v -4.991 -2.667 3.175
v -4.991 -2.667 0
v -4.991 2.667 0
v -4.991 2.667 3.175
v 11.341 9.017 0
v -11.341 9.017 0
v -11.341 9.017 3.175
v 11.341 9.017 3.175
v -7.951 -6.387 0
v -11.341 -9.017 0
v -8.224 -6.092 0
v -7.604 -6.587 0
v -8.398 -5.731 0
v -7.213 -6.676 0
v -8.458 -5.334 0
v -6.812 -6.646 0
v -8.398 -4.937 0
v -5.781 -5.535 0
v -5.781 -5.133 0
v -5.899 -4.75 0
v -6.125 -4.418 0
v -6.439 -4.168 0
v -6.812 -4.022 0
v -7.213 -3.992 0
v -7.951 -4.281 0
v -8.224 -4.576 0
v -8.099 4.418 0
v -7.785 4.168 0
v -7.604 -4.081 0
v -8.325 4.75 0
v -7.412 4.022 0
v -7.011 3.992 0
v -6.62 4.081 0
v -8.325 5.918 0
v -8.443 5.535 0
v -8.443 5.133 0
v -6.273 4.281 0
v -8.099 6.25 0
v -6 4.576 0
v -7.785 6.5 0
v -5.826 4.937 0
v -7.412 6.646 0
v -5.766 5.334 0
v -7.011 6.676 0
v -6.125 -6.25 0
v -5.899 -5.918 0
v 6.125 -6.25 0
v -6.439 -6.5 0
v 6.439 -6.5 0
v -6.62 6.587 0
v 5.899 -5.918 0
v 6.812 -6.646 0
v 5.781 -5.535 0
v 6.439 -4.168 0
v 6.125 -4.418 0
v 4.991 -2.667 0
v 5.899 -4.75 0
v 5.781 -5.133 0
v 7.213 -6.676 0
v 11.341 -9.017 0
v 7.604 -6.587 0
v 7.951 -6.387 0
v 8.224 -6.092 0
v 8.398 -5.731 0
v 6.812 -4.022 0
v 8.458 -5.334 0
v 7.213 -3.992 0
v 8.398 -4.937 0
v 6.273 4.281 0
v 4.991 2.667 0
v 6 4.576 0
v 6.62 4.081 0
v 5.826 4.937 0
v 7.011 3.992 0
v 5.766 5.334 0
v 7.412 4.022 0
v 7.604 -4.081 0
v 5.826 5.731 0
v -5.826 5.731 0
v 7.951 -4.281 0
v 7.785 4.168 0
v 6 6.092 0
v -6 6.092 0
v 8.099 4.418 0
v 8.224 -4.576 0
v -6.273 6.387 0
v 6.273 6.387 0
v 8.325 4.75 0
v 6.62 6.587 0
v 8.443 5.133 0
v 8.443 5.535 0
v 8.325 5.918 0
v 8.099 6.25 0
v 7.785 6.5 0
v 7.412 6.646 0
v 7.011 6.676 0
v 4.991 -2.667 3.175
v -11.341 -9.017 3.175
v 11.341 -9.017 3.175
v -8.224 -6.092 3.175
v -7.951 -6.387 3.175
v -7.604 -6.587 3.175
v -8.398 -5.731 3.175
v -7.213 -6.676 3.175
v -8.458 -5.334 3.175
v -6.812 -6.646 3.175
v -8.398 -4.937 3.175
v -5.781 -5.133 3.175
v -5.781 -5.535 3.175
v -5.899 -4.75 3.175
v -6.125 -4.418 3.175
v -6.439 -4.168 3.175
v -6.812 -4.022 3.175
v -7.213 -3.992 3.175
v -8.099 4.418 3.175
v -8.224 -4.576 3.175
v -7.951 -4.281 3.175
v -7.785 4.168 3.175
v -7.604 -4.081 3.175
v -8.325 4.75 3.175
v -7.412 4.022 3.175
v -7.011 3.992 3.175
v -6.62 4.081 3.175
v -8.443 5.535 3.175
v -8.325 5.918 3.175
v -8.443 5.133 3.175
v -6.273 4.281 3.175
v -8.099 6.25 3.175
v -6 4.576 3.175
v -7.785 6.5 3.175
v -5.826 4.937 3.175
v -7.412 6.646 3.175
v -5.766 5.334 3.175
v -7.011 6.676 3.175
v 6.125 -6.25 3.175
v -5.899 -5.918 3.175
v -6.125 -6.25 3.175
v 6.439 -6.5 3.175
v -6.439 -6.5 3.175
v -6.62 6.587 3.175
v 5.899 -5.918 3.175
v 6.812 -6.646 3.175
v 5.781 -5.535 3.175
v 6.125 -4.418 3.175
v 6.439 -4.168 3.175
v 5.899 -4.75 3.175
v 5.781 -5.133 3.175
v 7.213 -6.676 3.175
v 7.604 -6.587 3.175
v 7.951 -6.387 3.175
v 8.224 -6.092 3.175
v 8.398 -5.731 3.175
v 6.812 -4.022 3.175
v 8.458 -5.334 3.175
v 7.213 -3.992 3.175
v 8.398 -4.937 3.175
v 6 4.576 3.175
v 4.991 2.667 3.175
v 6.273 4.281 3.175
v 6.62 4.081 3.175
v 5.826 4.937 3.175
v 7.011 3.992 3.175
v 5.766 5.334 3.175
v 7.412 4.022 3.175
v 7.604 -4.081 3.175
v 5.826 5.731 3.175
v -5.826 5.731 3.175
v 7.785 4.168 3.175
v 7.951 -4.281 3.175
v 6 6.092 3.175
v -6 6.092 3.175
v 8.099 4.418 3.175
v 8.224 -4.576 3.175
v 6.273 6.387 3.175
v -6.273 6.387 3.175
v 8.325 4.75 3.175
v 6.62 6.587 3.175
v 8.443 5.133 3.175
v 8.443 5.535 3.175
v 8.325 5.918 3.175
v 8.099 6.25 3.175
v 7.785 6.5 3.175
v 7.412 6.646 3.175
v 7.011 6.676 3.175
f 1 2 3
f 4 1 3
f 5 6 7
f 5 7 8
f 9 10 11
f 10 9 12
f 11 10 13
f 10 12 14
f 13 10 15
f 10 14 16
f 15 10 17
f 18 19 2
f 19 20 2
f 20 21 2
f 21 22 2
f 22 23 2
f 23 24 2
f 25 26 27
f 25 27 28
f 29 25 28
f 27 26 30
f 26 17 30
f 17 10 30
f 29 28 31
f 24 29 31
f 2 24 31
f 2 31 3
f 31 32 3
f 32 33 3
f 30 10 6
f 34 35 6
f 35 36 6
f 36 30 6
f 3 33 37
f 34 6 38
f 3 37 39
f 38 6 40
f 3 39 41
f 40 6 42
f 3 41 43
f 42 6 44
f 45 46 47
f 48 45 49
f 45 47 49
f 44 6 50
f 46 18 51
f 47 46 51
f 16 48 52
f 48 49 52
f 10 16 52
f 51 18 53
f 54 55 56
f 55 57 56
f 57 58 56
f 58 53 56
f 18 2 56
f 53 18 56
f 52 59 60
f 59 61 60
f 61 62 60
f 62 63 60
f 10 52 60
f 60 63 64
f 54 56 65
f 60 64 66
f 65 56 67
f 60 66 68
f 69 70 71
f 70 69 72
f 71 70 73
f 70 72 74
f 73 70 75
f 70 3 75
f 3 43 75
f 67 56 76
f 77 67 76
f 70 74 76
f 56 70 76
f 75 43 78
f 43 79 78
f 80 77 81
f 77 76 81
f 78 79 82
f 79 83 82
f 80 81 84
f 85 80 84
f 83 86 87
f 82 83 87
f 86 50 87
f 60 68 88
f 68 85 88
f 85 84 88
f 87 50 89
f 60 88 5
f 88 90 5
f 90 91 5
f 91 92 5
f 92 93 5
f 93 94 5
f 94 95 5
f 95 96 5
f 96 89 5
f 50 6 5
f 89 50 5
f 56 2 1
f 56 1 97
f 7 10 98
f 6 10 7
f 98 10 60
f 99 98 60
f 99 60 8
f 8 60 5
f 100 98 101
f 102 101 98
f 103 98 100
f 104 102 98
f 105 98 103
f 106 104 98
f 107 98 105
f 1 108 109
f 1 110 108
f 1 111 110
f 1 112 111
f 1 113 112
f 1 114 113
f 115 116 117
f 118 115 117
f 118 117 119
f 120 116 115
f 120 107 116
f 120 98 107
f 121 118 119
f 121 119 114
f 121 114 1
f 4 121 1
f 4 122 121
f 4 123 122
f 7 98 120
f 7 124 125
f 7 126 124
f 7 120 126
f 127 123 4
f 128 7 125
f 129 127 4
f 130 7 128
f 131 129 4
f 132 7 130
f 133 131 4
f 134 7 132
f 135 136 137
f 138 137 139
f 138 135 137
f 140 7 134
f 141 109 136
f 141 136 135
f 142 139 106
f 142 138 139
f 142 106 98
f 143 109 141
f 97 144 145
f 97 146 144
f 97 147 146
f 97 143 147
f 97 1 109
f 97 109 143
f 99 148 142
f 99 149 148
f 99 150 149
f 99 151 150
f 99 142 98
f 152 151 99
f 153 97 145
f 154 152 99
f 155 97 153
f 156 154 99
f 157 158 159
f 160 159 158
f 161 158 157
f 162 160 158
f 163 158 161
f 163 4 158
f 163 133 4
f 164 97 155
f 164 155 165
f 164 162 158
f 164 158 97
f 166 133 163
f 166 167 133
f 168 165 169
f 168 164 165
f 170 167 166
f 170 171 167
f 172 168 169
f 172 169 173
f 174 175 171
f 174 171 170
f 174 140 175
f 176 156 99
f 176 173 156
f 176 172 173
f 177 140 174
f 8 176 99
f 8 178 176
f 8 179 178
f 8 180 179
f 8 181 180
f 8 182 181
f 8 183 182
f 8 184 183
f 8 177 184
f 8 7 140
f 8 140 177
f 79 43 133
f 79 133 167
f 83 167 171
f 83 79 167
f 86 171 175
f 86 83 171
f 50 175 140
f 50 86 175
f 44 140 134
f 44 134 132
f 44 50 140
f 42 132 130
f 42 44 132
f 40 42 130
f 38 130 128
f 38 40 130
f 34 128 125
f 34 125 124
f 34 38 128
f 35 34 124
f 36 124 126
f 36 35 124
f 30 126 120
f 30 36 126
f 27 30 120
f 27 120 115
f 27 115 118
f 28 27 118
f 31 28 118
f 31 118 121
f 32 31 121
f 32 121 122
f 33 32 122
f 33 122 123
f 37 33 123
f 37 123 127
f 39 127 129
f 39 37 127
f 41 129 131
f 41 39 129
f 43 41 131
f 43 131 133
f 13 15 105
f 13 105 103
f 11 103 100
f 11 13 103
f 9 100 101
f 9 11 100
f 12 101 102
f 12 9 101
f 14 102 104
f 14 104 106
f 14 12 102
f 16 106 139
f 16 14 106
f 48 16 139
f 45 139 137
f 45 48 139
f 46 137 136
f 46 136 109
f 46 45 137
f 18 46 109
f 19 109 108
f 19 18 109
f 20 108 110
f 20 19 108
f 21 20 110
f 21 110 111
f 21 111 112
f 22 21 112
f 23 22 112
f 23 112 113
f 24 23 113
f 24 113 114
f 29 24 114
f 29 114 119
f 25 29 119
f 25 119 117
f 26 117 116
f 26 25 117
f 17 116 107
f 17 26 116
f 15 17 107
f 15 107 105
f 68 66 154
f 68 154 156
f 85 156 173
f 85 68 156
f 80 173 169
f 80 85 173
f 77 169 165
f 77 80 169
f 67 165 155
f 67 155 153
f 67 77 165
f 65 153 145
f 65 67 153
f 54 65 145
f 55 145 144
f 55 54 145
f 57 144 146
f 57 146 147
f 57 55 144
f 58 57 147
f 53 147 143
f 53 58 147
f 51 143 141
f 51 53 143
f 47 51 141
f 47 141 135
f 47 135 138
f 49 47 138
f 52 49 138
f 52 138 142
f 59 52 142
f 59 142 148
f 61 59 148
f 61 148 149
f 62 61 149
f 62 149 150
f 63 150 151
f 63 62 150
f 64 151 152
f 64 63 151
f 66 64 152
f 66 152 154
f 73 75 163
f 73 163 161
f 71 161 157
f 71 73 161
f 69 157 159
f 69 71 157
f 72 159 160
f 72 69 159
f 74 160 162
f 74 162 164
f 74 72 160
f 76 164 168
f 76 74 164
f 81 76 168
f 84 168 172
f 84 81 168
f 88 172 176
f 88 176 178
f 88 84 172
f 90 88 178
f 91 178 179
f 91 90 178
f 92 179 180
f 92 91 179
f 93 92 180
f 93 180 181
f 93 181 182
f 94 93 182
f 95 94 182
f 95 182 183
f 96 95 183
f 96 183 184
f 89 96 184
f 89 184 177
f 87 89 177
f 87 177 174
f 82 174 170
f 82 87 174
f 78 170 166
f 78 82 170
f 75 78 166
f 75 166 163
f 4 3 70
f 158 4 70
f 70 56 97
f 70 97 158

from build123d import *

# Parameters (mm, degrees)
SKETCH2_W           = 22.6822
SKETCH2_H           = 18.034
SKETCH2_R           = 1.3462
SKETCH2_W_2         = 9.9822
SKETCH2_H_2         = 5.334
BOSS_EXTRUDE1_DEPTH = 3.175


with BuildPart() as part:
    # Sketch2 → Boss-Extrude1 (new body)
    with BuildSketch(Plane.XY):
        Rectangle(SKETCH2_W, SKETCH2_H)
        with Locations((-7.112, 5.334)):
            Circle(SKETCH2_R, mode=Mode.SUBTRACT)
        with Locations(Location((7.112, 5.334, 0), (0, 0, 180))):
            Circle(SKETCH2_R, mode=Mode.SUBTRACT)
        with Locations((7.112, -5.334)):
            Circle(SKETCH2_R, mode=Mode.SUBTRACT)
        with Locations(Location((-7.112, -5.334, 0), (0, 0, 180))):
            Circle(SKETCH2_R, mode=Mode.SUBTRACT)
        Rectangle(SKETCH2_W_2, SKETCH2_H_2, mode=Mode.SUBTRACT)
    extrude(amount=BOSS_EXTRUDE1_DEPTH)


solid = part.part
